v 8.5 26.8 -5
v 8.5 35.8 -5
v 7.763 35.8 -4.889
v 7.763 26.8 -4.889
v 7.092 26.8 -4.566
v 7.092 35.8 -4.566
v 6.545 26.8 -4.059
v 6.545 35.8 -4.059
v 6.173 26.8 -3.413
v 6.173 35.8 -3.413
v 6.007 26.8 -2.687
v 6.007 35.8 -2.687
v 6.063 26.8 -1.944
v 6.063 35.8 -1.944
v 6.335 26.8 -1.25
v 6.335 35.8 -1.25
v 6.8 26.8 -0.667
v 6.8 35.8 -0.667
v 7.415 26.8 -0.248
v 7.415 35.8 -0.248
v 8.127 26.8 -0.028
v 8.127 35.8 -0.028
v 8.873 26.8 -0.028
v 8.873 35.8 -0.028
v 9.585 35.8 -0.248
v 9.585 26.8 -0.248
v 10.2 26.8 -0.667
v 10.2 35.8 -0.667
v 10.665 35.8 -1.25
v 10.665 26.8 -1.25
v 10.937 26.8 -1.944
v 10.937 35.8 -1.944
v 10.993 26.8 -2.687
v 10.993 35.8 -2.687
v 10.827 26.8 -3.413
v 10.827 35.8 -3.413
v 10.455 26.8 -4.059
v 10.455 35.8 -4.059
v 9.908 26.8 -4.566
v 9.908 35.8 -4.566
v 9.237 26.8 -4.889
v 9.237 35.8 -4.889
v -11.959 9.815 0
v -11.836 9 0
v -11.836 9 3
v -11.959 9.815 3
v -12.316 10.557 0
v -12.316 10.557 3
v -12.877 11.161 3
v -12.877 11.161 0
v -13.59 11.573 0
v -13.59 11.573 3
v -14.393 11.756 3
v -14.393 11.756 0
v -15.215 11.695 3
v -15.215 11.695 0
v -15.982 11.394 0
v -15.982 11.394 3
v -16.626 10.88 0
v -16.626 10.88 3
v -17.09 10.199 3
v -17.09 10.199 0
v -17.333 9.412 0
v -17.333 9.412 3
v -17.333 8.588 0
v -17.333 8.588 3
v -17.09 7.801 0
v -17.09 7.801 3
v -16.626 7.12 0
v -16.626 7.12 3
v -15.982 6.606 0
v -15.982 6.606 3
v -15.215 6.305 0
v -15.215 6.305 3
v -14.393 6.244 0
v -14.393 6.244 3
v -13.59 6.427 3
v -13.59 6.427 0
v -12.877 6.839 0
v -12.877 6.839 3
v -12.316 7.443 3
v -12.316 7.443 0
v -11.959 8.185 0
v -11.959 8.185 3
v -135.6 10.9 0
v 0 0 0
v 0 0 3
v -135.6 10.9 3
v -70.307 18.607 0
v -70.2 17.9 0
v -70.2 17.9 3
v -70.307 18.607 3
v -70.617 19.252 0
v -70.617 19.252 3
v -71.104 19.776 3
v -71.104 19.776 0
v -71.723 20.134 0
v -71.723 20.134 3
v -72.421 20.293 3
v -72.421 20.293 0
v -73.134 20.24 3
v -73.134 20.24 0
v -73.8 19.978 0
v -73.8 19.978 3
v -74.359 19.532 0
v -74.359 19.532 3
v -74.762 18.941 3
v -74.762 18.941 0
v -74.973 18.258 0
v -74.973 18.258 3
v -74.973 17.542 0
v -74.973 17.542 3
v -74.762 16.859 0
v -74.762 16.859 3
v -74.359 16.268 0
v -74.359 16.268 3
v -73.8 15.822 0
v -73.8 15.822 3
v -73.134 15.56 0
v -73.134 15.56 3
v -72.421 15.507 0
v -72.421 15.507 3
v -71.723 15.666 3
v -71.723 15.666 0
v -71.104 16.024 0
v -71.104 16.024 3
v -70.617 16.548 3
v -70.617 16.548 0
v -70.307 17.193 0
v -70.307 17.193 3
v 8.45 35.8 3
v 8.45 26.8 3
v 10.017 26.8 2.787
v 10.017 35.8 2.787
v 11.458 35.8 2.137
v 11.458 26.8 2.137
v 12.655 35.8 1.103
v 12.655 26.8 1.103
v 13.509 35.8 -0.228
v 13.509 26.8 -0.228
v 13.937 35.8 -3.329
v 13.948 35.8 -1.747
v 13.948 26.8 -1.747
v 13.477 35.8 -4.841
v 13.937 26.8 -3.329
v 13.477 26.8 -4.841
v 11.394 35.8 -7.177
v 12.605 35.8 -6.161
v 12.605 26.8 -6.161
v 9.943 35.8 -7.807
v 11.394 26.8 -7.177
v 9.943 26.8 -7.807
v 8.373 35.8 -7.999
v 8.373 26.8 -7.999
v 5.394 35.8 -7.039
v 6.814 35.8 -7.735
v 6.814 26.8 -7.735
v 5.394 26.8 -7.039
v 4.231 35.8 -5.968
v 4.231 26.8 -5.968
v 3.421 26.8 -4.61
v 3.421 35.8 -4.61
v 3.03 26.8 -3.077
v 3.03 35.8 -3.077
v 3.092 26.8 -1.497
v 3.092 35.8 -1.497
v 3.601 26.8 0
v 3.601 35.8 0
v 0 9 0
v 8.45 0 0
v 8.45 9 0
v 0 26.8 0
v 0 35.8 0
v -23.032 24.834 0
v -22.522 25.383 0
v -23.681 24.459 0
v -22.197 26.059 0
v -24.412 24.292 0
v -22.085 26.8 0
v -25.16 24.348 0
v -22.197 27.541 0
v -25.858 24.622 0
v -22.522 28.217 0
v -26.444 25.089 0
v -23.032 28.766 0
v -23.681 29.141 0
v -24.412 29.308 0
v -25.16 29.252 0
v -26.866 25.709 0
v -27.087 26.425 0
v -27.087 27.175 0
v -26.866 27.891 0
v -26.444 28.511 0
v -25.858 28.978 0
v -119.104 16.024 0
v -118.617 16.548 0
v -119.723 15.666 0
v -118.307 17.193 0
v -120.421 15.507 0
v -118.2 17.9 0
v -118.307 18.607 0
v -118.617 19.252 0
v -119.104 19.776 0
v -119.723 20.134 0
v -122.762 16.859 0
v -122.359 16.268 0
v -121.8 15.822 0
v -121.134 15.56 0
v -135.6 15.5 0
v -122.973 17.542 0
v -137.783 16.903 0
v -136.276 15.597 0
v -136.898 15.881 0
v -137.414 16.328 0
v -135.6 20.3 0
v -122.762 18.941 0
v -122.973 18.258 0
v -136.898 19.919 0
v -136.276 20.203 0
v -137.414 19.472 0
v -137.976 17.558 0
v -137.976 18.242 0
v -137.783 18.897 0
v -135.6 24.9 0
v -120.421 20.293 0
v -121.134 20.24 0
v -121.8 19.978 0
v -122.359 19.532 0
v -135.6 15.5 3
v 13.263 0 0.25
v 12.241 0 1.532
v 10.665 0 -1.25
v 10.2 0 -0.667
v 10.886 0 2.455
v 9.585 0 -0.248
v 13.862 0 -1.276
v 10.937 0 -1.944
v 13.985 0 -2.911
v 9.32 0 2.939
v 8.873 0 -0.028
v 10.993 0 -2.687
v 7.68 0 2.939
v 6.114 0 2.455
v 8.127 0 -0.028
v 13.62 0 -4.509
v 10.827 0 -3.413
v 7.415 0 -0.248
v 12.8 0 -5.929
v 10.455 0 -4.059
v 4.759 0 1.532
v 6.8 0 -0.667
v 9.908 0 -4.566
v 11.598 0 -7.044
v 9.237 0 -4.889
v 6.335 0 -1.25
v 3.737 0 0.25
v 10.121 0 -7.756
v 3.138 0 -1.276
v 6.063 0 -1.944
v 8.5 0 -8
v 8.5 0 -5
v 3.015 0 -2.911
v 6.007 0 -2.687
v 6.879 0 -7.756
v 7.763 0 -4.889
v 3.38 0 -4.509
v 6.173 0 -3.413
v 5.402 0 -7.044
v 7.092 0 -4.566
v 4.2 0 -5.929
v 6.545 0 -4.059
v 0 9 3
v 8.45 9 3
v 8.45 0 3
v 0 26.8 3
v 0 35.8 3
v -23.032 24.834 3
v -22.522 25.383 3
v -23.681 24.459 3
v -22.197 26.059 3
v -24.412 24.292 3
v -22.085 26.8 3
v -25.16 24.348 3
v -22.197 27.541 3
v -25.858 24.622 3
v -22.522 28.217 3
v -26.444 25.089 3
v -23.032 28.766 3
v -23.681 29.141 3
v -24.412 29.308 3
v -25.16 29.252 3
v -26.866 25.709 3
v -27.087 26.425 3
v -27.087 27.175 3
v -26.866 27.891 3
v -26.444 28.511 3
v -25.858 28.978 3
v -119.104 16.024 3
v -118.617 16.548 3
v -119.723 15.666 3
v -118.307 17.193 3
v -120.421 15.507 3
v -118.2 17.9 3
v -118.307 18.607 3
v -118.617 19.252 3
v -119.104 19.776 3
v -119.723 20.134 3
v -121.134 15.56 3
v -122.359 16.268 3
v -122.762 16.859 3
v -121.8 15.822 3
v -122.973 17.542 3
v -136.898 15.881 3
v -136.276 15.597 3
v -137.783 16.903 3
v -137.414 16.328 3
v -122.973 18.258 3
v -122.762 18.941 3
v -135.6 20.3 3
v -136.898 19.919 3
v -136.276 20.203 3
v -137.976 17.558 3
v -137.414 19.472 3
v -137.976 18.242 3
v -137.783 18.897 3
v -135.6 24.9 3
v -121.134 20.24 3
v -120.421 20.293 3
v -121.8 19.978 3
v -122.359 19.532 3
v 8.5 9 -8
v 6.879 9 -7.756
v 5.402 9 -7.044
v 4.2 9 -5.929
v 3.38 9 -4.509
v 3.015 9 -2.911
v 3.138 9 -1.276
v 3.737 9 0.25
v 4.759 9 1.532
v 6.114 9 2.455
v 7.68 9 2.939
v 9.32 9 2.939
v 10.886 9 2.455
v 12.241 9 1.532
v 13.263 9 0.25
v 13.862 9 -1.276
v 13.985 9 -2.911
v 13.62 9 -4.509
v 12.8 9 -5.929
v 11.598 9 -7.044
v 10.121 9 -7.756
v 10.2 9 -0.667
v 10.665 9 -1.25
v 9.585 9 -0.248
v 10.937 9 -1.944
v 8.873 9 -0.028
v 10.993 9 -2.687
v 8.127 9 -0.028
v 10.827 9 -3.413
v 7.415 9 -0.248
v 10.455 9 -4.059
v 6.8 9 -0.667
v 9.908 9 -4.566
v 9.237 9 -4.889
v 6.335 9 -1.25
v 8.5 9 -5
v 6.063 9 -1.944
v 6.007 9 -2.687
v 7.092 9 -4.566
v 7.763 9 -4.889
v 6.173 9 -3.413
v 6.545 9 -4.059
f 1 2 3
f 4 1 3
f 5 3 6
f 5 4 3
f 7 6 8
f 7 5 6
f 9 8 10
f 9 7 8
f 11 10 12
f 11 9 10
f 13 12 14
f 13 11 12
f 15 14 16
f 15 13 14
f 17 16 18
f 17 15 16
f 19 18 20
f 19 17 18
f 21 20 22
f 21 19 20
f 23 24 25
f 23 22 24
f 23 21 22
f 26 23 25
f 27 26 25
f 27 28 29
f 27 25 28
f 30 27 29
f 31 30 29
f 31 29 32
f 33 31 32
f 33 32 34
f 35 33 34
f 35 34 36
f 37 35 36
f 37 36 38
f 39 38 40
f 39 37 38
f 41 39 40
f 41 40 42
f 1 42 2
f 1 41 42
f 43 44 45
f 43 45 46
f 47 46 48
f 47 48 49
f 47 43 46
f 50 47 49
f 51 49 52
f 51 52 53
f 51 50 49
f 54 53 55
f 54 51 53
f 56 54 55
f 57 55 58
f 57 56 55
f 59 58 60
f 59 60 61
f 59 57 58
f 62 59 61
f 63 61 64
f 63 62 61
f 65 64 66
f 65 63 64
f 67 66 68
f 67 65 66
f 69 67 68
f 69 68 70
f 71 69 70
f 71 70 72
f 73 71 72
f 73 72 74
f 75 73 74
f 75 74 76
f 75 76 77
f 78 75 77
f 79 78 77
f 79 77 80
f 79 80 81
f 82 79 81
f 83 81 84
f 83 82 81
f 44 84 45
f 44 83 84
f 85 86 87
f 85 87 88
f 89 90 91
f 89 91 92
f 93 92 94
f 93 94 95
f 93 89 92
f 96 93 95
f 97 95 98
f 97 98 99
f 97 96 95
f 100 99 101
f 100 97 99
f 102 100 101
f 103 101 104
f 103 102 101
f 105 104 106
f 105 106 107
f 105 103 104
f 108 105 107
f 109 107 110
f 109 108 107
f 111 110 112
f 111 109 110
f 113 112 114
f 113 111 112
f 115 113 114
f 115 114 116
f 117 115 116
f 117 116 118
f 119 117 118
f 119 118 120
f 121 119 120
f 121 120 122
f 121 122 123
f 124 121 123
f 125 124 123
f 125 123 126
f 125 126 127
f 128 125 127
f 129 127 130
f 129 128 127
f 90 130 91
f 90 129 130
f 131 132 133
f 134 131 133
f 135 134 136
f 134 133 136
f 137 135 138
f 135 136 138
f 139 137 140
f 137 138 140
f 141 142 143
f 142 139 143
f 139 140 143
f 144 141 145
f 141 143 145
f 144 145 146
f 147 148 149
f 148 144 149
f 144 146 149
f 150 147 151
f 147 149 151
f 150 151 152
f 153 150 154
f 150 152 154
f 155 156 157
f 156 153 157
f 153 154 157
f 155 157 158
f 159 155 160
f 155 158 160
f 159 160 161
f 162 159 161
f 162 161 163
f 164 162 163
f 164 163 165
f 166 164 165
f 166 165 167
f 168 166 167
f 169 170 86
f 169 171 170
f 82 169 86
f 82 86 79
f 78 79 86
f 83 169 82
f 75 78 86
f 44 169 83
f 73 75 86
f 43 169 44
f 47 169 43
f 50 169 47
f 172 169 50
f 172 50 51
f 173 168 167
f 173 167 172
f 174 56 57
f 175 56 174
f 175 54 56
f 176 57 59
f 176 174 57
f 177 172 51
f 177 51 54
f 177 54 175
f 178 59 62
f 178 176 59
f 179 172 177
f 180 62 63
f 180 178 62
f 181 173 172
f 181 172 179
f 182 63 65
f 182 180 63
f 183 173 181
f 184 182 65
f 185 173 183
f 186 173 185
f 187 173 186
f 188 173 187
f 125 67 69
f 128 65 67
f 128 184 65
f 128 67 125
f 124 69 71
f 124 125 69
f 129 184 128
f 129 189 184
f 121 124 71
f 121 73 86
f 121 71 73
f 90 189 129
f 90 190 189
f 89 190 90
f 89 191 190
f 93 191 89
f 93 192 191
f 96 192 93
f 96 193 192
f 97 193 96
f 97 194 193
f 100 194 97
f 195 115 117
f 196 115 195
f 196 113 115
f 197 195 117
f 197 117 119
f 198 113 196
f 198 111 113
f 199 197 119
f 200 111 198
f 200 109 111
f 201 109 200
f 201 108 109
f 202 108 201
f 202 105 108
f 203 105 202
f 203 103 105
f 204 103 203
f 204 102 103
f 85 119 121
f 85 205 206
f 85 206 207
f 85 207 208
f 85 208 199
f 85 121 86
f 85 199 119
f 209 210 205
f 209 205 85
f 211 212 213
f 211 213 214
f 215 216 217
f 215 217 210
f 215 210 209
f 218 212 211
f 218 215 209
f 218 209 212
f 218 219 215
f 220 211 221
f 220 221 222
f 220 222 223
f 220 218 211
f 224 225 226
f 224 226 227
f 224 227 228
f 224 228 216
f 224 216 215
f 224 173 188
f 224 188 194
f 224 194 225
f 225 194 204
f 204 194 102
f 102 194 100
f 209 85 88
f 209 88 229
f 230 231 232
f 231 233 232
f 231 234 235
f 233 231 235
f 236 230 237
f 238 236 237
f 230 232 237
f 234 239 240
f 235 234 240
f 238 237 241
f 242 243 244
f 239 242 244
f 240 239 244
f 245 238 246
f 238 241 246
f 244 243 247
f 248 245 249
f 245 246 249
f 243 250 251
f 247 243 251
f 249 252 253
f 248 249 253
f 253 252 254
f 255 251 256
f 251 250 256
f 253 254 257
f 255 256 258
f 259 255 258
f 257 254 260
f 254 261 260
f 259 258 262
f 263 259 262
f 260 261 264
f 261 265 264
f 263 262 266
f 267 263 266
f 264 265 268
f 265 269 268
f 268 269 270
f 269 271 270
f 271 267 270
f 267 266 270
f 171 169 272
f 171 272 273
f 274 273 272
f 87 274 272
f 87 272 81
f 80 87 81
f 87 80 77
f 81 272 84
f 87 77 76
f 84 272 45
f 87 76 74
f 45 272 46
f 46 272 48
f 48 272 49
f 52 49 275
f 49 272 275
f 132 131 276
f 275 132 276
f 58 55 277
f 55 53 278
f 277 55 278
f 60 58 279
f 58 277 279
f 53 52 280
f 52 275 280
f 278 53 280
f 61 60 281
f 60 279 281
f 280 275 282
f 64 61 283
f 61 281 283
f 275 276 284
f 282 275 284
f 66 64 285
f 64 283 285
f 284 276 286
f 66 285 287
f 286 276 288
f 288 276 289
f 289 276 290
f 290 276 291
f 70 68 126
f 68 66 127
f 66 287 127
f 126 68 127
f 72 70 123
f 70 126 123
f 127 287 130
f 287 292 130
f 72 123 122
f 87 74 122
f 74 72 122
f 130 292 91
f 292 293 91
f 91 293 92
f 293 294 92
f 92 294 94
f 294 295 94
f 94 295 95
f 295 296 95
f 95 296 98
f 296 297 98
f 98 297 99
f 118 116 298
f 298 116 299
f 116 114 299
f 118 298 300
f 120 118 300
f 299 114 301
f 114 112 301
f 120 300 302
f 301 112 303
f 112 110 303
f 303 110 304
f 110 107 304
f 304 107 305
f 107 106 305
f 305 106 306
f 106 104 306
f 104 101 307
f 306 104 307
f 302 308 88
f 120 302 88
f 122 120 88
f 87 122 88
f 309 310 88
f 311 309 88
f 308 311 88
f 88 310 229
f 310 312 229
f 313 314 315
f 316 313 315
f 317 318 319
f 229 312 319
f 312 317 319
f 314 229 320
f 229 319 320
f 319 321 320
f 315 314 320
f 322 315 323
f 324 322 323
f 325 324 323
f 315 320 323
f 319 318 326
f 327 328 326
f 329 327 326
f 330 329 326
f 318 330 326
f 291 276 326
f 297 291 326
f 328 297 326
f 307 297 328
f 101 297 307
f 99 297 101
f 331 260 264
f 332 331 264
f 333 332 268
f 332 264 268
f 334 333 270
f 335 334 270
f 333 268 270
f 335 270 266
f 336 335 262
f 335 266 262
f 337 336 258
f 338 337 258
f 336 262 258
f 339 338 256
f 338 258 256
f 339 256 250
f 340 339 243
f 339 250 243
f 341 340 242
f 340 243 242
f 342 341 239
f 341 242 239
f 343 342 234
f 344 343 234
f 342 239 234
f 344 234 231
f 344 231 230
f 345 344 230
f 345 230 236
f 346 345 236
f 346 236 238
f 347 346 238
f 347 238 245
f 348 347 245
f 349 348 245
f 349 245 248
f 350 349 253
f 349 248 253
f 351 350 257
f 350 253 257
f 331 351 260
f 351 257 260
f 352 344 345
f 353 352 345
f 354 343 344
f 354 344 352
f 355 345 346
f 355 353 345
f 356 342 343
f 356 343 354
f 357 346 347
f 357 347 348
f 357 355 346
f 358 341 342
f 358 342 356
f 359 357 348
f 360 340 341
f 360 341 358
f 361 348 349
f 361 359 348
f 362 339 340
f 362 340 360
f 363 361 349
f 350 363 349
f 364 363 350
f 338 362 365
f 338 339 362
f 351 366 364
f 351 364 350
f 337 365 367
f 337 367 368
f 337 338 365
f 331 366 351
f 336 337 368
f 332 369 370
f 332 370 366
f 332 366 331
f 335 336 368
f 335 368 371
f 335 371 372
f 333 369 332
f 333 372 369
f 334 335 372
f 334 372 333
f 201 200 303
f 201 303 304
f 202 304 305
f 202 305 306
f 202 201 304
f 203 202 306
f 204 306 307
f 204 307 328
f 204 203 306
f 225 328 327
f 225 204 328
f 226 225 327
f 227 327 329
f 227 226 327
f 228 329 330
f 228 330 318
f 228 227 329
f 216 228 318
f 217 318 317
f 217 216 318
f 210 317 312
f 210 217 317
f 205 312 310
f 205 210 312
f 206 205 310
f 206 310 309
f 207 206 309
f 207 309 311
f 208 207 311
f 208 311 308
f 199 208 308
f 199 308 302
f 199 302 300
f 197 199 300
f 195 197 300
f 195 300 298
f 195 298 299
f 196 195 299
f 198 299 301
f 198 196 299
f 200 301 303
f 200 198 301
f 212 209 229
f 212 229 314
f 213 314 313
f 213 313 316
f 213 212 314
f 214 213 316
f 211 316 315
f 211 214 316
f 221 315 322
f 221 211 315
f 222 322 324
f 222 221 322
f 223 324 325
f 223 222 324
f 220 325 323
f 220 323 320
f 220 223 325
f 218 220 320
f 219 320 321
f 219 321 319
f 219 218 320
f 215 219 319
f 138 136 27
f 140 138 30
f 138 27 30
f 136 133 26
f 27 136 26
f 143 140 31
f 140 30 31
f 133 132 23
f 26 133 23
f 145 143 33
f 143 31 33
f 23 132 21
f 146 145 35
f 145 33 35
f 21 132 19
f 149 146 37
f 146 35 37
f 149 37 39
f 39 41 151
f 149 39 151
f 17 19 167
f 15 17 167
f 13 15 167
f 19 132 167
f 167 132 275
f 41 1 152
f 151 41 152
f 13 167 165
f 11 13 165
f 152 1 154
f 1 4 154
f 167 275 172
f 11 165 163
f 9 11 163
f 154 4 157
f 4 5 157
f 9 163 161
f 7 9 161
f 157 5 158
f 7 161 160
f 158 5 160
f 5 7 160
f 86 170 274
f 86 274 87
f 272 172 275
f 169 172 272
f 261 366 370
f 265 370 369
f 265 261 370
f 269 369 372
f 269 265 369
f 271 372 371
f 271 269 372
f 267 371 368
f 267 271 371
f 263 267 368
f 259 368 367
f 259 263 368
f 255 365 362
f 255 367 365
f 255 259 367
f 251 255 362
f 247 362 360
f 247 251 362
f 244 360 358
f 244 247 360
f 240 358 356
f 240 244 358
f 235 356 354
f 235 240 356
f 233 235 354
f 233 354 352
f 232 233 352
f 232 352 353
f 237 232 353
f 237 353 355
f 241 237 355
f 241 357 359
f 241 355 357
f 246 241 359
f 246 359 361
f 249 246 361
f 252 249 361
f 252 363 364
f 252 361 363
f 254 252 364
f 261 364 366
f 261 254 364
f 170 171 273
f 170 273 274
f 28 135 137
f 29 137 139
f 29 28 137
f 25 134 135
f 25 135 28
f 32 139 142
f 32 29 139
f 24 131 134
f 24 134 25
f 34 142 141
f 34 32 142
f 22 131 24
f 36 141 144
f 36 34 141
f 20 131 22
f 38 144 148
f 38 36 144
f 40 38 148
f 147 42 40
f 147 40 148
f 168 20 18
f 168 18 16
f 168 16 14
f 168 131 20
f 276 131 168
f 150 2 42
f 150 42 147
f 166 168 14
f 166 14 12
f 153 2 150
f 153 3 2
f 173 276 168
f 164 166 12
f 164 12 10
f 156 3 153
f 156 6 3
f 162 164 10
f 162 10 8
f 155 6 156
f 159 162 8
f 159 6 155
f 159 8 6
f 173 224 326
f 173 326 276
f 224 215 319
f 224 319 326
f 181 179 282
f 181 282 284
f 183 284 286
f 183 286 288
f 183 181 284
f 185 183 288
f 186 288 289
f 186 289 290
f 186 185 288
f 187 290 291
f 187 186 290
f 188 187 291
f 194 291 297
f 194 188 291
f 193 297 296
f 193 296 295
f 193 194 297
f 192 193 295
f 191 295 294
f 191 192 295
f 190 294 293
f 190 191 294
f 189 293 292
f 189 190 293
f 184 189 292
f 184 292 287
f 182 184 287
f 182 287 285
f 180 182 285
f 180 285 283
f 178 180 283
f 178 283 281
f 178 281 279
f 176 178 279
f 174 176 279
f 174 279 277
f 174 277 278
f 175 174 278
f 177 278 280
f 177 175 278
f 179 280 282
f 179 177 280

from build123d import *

# Parameters (mm, degrees)
SKETCH1_R           = 2.4
SKETCH1_R_2         = 2.515000774
SKETCH1_R_3         = 2.764002303
BOSS_EXTRUDE1_DEPTH = 3
SKETCH2_R           = 5.5
BOSS_EXTRUDE2_DEPTH = 9
BOSS_EXTRUDE3_START = 26.8
SKETCH2_2_R         = 5.5
BOSS_EXTRUDE3_DEPTH = 9
SKETCH4_R           = 2.5
CUT_EXTRUDE1_DEPTH  = 143.792296711


with BuildPart() as part:
    # Sketch1 → Boss-Extrude1 (new body)
    with BuildSketch(Plane.XY):
        with BuildLine():
            Line((0, 0), (-135.6, 10.9))
            Line((-135.6, 10.9), (-135.6, 15.5))
            ThreePointArc((-135.6, 15.5), (-138, 17.9), (-135.6, 20.3))
            Line((-135.6, 20.3), (-135.6, 24.9))
            Line((-135.6, 24.9), (0, 35.8))
            Line((0, 35.8), (8.449966918, 35.8))
            Line((8.449966918, 35.8), (8.449966918, 26.8))
            Line((8.449966918, 26.8), (0, 26.8))
            Line((0, 26.8), (0, 9))
            Line((0, 9), (8.449966918, 9))
            Line((8.449966918, 9), (8.449966918, 0))
            Line((8.449966918, 0), (0, 0))
        make_face()
        with Locations((-120.6, 17.9)):
            Circle(SKETCH1_R, mode=Mode.SUBTRACT)
        with Locations((-72.6, 17.9)):
            Circle(SKETCH1_R, mode=Mode.SUBTRACT)
        with Locations((-24.6, 26.8)):
            Circle(SKETCH1_R_2, mode=Mode.SUBTRACT)
        with Locations((-14.6, 9)):
            Circle(SKETCH1_R_3, mode=Mode.SUBTRACT)
    extrude(amount=BOSS_EXTRUDE1_DEPTH)

    # Sketch2<2> → Boss-Extrude3 (add)
    with BuildSketch(Plane(origin=(0, 0, 0), x_dir=(1, 0, 0), z_dir=(0, 1, 0)).offset(BOSS_EXTRUDE3_START)):
        with Locations(Location((8.5, 2.5, 0), (0, 0, 90))):
            Circle(SKETCH2_2_R)
    extrude(amount=BOSS_EXTRUDE3_DEPTH)


with BuildPart() as body_2:
    # Sketch2 → Boss-Extrude2 (new body)
    with BuildSketch(Plane(origin=(0, 0, 0), x_dir=(1, 0, 0), z_dir=(0, 1, 0))):
        with Locations(Location((8.5, 2.5, 0), (0, 0, 90))):
            Circle(SKETCH2_R)
    extrude(amount=BOSS_EXTRUDE2_DEPTH)


with BuildPart() as cut_extrude1_tool:
    # Sketch4 → Cut-Extrude1 (new, through all)
    with BuildSketch(Plane(origin=(0, 0, 0), x_dir=(1, 0, 0), z_dir=(0, 1, 0))):
        with Locations(Location((8.5, 2.5, 0), (0, 0, 90))):
            Circle(SKETCH4_R)
    extrude(amount=CUT_EXTRUDE1_DEPTH)


with BuildPart() as part_1:
    add(part.part)

    # Cut-Extrude1: cut by cut_extrude1_tool
    add(cut_extrude1_tool.part, mode=Mode.SUBTRACT)


with BuildPart() as body_2_1:
    add(body_2.part)

    # Cut-Extrude1: cut by cut_extrude1_tool
    add(cut_extrude1_tool.part, mode=Mode.SUBTRACT)


solid = Compound([part_1.part, body_2_1.part])
